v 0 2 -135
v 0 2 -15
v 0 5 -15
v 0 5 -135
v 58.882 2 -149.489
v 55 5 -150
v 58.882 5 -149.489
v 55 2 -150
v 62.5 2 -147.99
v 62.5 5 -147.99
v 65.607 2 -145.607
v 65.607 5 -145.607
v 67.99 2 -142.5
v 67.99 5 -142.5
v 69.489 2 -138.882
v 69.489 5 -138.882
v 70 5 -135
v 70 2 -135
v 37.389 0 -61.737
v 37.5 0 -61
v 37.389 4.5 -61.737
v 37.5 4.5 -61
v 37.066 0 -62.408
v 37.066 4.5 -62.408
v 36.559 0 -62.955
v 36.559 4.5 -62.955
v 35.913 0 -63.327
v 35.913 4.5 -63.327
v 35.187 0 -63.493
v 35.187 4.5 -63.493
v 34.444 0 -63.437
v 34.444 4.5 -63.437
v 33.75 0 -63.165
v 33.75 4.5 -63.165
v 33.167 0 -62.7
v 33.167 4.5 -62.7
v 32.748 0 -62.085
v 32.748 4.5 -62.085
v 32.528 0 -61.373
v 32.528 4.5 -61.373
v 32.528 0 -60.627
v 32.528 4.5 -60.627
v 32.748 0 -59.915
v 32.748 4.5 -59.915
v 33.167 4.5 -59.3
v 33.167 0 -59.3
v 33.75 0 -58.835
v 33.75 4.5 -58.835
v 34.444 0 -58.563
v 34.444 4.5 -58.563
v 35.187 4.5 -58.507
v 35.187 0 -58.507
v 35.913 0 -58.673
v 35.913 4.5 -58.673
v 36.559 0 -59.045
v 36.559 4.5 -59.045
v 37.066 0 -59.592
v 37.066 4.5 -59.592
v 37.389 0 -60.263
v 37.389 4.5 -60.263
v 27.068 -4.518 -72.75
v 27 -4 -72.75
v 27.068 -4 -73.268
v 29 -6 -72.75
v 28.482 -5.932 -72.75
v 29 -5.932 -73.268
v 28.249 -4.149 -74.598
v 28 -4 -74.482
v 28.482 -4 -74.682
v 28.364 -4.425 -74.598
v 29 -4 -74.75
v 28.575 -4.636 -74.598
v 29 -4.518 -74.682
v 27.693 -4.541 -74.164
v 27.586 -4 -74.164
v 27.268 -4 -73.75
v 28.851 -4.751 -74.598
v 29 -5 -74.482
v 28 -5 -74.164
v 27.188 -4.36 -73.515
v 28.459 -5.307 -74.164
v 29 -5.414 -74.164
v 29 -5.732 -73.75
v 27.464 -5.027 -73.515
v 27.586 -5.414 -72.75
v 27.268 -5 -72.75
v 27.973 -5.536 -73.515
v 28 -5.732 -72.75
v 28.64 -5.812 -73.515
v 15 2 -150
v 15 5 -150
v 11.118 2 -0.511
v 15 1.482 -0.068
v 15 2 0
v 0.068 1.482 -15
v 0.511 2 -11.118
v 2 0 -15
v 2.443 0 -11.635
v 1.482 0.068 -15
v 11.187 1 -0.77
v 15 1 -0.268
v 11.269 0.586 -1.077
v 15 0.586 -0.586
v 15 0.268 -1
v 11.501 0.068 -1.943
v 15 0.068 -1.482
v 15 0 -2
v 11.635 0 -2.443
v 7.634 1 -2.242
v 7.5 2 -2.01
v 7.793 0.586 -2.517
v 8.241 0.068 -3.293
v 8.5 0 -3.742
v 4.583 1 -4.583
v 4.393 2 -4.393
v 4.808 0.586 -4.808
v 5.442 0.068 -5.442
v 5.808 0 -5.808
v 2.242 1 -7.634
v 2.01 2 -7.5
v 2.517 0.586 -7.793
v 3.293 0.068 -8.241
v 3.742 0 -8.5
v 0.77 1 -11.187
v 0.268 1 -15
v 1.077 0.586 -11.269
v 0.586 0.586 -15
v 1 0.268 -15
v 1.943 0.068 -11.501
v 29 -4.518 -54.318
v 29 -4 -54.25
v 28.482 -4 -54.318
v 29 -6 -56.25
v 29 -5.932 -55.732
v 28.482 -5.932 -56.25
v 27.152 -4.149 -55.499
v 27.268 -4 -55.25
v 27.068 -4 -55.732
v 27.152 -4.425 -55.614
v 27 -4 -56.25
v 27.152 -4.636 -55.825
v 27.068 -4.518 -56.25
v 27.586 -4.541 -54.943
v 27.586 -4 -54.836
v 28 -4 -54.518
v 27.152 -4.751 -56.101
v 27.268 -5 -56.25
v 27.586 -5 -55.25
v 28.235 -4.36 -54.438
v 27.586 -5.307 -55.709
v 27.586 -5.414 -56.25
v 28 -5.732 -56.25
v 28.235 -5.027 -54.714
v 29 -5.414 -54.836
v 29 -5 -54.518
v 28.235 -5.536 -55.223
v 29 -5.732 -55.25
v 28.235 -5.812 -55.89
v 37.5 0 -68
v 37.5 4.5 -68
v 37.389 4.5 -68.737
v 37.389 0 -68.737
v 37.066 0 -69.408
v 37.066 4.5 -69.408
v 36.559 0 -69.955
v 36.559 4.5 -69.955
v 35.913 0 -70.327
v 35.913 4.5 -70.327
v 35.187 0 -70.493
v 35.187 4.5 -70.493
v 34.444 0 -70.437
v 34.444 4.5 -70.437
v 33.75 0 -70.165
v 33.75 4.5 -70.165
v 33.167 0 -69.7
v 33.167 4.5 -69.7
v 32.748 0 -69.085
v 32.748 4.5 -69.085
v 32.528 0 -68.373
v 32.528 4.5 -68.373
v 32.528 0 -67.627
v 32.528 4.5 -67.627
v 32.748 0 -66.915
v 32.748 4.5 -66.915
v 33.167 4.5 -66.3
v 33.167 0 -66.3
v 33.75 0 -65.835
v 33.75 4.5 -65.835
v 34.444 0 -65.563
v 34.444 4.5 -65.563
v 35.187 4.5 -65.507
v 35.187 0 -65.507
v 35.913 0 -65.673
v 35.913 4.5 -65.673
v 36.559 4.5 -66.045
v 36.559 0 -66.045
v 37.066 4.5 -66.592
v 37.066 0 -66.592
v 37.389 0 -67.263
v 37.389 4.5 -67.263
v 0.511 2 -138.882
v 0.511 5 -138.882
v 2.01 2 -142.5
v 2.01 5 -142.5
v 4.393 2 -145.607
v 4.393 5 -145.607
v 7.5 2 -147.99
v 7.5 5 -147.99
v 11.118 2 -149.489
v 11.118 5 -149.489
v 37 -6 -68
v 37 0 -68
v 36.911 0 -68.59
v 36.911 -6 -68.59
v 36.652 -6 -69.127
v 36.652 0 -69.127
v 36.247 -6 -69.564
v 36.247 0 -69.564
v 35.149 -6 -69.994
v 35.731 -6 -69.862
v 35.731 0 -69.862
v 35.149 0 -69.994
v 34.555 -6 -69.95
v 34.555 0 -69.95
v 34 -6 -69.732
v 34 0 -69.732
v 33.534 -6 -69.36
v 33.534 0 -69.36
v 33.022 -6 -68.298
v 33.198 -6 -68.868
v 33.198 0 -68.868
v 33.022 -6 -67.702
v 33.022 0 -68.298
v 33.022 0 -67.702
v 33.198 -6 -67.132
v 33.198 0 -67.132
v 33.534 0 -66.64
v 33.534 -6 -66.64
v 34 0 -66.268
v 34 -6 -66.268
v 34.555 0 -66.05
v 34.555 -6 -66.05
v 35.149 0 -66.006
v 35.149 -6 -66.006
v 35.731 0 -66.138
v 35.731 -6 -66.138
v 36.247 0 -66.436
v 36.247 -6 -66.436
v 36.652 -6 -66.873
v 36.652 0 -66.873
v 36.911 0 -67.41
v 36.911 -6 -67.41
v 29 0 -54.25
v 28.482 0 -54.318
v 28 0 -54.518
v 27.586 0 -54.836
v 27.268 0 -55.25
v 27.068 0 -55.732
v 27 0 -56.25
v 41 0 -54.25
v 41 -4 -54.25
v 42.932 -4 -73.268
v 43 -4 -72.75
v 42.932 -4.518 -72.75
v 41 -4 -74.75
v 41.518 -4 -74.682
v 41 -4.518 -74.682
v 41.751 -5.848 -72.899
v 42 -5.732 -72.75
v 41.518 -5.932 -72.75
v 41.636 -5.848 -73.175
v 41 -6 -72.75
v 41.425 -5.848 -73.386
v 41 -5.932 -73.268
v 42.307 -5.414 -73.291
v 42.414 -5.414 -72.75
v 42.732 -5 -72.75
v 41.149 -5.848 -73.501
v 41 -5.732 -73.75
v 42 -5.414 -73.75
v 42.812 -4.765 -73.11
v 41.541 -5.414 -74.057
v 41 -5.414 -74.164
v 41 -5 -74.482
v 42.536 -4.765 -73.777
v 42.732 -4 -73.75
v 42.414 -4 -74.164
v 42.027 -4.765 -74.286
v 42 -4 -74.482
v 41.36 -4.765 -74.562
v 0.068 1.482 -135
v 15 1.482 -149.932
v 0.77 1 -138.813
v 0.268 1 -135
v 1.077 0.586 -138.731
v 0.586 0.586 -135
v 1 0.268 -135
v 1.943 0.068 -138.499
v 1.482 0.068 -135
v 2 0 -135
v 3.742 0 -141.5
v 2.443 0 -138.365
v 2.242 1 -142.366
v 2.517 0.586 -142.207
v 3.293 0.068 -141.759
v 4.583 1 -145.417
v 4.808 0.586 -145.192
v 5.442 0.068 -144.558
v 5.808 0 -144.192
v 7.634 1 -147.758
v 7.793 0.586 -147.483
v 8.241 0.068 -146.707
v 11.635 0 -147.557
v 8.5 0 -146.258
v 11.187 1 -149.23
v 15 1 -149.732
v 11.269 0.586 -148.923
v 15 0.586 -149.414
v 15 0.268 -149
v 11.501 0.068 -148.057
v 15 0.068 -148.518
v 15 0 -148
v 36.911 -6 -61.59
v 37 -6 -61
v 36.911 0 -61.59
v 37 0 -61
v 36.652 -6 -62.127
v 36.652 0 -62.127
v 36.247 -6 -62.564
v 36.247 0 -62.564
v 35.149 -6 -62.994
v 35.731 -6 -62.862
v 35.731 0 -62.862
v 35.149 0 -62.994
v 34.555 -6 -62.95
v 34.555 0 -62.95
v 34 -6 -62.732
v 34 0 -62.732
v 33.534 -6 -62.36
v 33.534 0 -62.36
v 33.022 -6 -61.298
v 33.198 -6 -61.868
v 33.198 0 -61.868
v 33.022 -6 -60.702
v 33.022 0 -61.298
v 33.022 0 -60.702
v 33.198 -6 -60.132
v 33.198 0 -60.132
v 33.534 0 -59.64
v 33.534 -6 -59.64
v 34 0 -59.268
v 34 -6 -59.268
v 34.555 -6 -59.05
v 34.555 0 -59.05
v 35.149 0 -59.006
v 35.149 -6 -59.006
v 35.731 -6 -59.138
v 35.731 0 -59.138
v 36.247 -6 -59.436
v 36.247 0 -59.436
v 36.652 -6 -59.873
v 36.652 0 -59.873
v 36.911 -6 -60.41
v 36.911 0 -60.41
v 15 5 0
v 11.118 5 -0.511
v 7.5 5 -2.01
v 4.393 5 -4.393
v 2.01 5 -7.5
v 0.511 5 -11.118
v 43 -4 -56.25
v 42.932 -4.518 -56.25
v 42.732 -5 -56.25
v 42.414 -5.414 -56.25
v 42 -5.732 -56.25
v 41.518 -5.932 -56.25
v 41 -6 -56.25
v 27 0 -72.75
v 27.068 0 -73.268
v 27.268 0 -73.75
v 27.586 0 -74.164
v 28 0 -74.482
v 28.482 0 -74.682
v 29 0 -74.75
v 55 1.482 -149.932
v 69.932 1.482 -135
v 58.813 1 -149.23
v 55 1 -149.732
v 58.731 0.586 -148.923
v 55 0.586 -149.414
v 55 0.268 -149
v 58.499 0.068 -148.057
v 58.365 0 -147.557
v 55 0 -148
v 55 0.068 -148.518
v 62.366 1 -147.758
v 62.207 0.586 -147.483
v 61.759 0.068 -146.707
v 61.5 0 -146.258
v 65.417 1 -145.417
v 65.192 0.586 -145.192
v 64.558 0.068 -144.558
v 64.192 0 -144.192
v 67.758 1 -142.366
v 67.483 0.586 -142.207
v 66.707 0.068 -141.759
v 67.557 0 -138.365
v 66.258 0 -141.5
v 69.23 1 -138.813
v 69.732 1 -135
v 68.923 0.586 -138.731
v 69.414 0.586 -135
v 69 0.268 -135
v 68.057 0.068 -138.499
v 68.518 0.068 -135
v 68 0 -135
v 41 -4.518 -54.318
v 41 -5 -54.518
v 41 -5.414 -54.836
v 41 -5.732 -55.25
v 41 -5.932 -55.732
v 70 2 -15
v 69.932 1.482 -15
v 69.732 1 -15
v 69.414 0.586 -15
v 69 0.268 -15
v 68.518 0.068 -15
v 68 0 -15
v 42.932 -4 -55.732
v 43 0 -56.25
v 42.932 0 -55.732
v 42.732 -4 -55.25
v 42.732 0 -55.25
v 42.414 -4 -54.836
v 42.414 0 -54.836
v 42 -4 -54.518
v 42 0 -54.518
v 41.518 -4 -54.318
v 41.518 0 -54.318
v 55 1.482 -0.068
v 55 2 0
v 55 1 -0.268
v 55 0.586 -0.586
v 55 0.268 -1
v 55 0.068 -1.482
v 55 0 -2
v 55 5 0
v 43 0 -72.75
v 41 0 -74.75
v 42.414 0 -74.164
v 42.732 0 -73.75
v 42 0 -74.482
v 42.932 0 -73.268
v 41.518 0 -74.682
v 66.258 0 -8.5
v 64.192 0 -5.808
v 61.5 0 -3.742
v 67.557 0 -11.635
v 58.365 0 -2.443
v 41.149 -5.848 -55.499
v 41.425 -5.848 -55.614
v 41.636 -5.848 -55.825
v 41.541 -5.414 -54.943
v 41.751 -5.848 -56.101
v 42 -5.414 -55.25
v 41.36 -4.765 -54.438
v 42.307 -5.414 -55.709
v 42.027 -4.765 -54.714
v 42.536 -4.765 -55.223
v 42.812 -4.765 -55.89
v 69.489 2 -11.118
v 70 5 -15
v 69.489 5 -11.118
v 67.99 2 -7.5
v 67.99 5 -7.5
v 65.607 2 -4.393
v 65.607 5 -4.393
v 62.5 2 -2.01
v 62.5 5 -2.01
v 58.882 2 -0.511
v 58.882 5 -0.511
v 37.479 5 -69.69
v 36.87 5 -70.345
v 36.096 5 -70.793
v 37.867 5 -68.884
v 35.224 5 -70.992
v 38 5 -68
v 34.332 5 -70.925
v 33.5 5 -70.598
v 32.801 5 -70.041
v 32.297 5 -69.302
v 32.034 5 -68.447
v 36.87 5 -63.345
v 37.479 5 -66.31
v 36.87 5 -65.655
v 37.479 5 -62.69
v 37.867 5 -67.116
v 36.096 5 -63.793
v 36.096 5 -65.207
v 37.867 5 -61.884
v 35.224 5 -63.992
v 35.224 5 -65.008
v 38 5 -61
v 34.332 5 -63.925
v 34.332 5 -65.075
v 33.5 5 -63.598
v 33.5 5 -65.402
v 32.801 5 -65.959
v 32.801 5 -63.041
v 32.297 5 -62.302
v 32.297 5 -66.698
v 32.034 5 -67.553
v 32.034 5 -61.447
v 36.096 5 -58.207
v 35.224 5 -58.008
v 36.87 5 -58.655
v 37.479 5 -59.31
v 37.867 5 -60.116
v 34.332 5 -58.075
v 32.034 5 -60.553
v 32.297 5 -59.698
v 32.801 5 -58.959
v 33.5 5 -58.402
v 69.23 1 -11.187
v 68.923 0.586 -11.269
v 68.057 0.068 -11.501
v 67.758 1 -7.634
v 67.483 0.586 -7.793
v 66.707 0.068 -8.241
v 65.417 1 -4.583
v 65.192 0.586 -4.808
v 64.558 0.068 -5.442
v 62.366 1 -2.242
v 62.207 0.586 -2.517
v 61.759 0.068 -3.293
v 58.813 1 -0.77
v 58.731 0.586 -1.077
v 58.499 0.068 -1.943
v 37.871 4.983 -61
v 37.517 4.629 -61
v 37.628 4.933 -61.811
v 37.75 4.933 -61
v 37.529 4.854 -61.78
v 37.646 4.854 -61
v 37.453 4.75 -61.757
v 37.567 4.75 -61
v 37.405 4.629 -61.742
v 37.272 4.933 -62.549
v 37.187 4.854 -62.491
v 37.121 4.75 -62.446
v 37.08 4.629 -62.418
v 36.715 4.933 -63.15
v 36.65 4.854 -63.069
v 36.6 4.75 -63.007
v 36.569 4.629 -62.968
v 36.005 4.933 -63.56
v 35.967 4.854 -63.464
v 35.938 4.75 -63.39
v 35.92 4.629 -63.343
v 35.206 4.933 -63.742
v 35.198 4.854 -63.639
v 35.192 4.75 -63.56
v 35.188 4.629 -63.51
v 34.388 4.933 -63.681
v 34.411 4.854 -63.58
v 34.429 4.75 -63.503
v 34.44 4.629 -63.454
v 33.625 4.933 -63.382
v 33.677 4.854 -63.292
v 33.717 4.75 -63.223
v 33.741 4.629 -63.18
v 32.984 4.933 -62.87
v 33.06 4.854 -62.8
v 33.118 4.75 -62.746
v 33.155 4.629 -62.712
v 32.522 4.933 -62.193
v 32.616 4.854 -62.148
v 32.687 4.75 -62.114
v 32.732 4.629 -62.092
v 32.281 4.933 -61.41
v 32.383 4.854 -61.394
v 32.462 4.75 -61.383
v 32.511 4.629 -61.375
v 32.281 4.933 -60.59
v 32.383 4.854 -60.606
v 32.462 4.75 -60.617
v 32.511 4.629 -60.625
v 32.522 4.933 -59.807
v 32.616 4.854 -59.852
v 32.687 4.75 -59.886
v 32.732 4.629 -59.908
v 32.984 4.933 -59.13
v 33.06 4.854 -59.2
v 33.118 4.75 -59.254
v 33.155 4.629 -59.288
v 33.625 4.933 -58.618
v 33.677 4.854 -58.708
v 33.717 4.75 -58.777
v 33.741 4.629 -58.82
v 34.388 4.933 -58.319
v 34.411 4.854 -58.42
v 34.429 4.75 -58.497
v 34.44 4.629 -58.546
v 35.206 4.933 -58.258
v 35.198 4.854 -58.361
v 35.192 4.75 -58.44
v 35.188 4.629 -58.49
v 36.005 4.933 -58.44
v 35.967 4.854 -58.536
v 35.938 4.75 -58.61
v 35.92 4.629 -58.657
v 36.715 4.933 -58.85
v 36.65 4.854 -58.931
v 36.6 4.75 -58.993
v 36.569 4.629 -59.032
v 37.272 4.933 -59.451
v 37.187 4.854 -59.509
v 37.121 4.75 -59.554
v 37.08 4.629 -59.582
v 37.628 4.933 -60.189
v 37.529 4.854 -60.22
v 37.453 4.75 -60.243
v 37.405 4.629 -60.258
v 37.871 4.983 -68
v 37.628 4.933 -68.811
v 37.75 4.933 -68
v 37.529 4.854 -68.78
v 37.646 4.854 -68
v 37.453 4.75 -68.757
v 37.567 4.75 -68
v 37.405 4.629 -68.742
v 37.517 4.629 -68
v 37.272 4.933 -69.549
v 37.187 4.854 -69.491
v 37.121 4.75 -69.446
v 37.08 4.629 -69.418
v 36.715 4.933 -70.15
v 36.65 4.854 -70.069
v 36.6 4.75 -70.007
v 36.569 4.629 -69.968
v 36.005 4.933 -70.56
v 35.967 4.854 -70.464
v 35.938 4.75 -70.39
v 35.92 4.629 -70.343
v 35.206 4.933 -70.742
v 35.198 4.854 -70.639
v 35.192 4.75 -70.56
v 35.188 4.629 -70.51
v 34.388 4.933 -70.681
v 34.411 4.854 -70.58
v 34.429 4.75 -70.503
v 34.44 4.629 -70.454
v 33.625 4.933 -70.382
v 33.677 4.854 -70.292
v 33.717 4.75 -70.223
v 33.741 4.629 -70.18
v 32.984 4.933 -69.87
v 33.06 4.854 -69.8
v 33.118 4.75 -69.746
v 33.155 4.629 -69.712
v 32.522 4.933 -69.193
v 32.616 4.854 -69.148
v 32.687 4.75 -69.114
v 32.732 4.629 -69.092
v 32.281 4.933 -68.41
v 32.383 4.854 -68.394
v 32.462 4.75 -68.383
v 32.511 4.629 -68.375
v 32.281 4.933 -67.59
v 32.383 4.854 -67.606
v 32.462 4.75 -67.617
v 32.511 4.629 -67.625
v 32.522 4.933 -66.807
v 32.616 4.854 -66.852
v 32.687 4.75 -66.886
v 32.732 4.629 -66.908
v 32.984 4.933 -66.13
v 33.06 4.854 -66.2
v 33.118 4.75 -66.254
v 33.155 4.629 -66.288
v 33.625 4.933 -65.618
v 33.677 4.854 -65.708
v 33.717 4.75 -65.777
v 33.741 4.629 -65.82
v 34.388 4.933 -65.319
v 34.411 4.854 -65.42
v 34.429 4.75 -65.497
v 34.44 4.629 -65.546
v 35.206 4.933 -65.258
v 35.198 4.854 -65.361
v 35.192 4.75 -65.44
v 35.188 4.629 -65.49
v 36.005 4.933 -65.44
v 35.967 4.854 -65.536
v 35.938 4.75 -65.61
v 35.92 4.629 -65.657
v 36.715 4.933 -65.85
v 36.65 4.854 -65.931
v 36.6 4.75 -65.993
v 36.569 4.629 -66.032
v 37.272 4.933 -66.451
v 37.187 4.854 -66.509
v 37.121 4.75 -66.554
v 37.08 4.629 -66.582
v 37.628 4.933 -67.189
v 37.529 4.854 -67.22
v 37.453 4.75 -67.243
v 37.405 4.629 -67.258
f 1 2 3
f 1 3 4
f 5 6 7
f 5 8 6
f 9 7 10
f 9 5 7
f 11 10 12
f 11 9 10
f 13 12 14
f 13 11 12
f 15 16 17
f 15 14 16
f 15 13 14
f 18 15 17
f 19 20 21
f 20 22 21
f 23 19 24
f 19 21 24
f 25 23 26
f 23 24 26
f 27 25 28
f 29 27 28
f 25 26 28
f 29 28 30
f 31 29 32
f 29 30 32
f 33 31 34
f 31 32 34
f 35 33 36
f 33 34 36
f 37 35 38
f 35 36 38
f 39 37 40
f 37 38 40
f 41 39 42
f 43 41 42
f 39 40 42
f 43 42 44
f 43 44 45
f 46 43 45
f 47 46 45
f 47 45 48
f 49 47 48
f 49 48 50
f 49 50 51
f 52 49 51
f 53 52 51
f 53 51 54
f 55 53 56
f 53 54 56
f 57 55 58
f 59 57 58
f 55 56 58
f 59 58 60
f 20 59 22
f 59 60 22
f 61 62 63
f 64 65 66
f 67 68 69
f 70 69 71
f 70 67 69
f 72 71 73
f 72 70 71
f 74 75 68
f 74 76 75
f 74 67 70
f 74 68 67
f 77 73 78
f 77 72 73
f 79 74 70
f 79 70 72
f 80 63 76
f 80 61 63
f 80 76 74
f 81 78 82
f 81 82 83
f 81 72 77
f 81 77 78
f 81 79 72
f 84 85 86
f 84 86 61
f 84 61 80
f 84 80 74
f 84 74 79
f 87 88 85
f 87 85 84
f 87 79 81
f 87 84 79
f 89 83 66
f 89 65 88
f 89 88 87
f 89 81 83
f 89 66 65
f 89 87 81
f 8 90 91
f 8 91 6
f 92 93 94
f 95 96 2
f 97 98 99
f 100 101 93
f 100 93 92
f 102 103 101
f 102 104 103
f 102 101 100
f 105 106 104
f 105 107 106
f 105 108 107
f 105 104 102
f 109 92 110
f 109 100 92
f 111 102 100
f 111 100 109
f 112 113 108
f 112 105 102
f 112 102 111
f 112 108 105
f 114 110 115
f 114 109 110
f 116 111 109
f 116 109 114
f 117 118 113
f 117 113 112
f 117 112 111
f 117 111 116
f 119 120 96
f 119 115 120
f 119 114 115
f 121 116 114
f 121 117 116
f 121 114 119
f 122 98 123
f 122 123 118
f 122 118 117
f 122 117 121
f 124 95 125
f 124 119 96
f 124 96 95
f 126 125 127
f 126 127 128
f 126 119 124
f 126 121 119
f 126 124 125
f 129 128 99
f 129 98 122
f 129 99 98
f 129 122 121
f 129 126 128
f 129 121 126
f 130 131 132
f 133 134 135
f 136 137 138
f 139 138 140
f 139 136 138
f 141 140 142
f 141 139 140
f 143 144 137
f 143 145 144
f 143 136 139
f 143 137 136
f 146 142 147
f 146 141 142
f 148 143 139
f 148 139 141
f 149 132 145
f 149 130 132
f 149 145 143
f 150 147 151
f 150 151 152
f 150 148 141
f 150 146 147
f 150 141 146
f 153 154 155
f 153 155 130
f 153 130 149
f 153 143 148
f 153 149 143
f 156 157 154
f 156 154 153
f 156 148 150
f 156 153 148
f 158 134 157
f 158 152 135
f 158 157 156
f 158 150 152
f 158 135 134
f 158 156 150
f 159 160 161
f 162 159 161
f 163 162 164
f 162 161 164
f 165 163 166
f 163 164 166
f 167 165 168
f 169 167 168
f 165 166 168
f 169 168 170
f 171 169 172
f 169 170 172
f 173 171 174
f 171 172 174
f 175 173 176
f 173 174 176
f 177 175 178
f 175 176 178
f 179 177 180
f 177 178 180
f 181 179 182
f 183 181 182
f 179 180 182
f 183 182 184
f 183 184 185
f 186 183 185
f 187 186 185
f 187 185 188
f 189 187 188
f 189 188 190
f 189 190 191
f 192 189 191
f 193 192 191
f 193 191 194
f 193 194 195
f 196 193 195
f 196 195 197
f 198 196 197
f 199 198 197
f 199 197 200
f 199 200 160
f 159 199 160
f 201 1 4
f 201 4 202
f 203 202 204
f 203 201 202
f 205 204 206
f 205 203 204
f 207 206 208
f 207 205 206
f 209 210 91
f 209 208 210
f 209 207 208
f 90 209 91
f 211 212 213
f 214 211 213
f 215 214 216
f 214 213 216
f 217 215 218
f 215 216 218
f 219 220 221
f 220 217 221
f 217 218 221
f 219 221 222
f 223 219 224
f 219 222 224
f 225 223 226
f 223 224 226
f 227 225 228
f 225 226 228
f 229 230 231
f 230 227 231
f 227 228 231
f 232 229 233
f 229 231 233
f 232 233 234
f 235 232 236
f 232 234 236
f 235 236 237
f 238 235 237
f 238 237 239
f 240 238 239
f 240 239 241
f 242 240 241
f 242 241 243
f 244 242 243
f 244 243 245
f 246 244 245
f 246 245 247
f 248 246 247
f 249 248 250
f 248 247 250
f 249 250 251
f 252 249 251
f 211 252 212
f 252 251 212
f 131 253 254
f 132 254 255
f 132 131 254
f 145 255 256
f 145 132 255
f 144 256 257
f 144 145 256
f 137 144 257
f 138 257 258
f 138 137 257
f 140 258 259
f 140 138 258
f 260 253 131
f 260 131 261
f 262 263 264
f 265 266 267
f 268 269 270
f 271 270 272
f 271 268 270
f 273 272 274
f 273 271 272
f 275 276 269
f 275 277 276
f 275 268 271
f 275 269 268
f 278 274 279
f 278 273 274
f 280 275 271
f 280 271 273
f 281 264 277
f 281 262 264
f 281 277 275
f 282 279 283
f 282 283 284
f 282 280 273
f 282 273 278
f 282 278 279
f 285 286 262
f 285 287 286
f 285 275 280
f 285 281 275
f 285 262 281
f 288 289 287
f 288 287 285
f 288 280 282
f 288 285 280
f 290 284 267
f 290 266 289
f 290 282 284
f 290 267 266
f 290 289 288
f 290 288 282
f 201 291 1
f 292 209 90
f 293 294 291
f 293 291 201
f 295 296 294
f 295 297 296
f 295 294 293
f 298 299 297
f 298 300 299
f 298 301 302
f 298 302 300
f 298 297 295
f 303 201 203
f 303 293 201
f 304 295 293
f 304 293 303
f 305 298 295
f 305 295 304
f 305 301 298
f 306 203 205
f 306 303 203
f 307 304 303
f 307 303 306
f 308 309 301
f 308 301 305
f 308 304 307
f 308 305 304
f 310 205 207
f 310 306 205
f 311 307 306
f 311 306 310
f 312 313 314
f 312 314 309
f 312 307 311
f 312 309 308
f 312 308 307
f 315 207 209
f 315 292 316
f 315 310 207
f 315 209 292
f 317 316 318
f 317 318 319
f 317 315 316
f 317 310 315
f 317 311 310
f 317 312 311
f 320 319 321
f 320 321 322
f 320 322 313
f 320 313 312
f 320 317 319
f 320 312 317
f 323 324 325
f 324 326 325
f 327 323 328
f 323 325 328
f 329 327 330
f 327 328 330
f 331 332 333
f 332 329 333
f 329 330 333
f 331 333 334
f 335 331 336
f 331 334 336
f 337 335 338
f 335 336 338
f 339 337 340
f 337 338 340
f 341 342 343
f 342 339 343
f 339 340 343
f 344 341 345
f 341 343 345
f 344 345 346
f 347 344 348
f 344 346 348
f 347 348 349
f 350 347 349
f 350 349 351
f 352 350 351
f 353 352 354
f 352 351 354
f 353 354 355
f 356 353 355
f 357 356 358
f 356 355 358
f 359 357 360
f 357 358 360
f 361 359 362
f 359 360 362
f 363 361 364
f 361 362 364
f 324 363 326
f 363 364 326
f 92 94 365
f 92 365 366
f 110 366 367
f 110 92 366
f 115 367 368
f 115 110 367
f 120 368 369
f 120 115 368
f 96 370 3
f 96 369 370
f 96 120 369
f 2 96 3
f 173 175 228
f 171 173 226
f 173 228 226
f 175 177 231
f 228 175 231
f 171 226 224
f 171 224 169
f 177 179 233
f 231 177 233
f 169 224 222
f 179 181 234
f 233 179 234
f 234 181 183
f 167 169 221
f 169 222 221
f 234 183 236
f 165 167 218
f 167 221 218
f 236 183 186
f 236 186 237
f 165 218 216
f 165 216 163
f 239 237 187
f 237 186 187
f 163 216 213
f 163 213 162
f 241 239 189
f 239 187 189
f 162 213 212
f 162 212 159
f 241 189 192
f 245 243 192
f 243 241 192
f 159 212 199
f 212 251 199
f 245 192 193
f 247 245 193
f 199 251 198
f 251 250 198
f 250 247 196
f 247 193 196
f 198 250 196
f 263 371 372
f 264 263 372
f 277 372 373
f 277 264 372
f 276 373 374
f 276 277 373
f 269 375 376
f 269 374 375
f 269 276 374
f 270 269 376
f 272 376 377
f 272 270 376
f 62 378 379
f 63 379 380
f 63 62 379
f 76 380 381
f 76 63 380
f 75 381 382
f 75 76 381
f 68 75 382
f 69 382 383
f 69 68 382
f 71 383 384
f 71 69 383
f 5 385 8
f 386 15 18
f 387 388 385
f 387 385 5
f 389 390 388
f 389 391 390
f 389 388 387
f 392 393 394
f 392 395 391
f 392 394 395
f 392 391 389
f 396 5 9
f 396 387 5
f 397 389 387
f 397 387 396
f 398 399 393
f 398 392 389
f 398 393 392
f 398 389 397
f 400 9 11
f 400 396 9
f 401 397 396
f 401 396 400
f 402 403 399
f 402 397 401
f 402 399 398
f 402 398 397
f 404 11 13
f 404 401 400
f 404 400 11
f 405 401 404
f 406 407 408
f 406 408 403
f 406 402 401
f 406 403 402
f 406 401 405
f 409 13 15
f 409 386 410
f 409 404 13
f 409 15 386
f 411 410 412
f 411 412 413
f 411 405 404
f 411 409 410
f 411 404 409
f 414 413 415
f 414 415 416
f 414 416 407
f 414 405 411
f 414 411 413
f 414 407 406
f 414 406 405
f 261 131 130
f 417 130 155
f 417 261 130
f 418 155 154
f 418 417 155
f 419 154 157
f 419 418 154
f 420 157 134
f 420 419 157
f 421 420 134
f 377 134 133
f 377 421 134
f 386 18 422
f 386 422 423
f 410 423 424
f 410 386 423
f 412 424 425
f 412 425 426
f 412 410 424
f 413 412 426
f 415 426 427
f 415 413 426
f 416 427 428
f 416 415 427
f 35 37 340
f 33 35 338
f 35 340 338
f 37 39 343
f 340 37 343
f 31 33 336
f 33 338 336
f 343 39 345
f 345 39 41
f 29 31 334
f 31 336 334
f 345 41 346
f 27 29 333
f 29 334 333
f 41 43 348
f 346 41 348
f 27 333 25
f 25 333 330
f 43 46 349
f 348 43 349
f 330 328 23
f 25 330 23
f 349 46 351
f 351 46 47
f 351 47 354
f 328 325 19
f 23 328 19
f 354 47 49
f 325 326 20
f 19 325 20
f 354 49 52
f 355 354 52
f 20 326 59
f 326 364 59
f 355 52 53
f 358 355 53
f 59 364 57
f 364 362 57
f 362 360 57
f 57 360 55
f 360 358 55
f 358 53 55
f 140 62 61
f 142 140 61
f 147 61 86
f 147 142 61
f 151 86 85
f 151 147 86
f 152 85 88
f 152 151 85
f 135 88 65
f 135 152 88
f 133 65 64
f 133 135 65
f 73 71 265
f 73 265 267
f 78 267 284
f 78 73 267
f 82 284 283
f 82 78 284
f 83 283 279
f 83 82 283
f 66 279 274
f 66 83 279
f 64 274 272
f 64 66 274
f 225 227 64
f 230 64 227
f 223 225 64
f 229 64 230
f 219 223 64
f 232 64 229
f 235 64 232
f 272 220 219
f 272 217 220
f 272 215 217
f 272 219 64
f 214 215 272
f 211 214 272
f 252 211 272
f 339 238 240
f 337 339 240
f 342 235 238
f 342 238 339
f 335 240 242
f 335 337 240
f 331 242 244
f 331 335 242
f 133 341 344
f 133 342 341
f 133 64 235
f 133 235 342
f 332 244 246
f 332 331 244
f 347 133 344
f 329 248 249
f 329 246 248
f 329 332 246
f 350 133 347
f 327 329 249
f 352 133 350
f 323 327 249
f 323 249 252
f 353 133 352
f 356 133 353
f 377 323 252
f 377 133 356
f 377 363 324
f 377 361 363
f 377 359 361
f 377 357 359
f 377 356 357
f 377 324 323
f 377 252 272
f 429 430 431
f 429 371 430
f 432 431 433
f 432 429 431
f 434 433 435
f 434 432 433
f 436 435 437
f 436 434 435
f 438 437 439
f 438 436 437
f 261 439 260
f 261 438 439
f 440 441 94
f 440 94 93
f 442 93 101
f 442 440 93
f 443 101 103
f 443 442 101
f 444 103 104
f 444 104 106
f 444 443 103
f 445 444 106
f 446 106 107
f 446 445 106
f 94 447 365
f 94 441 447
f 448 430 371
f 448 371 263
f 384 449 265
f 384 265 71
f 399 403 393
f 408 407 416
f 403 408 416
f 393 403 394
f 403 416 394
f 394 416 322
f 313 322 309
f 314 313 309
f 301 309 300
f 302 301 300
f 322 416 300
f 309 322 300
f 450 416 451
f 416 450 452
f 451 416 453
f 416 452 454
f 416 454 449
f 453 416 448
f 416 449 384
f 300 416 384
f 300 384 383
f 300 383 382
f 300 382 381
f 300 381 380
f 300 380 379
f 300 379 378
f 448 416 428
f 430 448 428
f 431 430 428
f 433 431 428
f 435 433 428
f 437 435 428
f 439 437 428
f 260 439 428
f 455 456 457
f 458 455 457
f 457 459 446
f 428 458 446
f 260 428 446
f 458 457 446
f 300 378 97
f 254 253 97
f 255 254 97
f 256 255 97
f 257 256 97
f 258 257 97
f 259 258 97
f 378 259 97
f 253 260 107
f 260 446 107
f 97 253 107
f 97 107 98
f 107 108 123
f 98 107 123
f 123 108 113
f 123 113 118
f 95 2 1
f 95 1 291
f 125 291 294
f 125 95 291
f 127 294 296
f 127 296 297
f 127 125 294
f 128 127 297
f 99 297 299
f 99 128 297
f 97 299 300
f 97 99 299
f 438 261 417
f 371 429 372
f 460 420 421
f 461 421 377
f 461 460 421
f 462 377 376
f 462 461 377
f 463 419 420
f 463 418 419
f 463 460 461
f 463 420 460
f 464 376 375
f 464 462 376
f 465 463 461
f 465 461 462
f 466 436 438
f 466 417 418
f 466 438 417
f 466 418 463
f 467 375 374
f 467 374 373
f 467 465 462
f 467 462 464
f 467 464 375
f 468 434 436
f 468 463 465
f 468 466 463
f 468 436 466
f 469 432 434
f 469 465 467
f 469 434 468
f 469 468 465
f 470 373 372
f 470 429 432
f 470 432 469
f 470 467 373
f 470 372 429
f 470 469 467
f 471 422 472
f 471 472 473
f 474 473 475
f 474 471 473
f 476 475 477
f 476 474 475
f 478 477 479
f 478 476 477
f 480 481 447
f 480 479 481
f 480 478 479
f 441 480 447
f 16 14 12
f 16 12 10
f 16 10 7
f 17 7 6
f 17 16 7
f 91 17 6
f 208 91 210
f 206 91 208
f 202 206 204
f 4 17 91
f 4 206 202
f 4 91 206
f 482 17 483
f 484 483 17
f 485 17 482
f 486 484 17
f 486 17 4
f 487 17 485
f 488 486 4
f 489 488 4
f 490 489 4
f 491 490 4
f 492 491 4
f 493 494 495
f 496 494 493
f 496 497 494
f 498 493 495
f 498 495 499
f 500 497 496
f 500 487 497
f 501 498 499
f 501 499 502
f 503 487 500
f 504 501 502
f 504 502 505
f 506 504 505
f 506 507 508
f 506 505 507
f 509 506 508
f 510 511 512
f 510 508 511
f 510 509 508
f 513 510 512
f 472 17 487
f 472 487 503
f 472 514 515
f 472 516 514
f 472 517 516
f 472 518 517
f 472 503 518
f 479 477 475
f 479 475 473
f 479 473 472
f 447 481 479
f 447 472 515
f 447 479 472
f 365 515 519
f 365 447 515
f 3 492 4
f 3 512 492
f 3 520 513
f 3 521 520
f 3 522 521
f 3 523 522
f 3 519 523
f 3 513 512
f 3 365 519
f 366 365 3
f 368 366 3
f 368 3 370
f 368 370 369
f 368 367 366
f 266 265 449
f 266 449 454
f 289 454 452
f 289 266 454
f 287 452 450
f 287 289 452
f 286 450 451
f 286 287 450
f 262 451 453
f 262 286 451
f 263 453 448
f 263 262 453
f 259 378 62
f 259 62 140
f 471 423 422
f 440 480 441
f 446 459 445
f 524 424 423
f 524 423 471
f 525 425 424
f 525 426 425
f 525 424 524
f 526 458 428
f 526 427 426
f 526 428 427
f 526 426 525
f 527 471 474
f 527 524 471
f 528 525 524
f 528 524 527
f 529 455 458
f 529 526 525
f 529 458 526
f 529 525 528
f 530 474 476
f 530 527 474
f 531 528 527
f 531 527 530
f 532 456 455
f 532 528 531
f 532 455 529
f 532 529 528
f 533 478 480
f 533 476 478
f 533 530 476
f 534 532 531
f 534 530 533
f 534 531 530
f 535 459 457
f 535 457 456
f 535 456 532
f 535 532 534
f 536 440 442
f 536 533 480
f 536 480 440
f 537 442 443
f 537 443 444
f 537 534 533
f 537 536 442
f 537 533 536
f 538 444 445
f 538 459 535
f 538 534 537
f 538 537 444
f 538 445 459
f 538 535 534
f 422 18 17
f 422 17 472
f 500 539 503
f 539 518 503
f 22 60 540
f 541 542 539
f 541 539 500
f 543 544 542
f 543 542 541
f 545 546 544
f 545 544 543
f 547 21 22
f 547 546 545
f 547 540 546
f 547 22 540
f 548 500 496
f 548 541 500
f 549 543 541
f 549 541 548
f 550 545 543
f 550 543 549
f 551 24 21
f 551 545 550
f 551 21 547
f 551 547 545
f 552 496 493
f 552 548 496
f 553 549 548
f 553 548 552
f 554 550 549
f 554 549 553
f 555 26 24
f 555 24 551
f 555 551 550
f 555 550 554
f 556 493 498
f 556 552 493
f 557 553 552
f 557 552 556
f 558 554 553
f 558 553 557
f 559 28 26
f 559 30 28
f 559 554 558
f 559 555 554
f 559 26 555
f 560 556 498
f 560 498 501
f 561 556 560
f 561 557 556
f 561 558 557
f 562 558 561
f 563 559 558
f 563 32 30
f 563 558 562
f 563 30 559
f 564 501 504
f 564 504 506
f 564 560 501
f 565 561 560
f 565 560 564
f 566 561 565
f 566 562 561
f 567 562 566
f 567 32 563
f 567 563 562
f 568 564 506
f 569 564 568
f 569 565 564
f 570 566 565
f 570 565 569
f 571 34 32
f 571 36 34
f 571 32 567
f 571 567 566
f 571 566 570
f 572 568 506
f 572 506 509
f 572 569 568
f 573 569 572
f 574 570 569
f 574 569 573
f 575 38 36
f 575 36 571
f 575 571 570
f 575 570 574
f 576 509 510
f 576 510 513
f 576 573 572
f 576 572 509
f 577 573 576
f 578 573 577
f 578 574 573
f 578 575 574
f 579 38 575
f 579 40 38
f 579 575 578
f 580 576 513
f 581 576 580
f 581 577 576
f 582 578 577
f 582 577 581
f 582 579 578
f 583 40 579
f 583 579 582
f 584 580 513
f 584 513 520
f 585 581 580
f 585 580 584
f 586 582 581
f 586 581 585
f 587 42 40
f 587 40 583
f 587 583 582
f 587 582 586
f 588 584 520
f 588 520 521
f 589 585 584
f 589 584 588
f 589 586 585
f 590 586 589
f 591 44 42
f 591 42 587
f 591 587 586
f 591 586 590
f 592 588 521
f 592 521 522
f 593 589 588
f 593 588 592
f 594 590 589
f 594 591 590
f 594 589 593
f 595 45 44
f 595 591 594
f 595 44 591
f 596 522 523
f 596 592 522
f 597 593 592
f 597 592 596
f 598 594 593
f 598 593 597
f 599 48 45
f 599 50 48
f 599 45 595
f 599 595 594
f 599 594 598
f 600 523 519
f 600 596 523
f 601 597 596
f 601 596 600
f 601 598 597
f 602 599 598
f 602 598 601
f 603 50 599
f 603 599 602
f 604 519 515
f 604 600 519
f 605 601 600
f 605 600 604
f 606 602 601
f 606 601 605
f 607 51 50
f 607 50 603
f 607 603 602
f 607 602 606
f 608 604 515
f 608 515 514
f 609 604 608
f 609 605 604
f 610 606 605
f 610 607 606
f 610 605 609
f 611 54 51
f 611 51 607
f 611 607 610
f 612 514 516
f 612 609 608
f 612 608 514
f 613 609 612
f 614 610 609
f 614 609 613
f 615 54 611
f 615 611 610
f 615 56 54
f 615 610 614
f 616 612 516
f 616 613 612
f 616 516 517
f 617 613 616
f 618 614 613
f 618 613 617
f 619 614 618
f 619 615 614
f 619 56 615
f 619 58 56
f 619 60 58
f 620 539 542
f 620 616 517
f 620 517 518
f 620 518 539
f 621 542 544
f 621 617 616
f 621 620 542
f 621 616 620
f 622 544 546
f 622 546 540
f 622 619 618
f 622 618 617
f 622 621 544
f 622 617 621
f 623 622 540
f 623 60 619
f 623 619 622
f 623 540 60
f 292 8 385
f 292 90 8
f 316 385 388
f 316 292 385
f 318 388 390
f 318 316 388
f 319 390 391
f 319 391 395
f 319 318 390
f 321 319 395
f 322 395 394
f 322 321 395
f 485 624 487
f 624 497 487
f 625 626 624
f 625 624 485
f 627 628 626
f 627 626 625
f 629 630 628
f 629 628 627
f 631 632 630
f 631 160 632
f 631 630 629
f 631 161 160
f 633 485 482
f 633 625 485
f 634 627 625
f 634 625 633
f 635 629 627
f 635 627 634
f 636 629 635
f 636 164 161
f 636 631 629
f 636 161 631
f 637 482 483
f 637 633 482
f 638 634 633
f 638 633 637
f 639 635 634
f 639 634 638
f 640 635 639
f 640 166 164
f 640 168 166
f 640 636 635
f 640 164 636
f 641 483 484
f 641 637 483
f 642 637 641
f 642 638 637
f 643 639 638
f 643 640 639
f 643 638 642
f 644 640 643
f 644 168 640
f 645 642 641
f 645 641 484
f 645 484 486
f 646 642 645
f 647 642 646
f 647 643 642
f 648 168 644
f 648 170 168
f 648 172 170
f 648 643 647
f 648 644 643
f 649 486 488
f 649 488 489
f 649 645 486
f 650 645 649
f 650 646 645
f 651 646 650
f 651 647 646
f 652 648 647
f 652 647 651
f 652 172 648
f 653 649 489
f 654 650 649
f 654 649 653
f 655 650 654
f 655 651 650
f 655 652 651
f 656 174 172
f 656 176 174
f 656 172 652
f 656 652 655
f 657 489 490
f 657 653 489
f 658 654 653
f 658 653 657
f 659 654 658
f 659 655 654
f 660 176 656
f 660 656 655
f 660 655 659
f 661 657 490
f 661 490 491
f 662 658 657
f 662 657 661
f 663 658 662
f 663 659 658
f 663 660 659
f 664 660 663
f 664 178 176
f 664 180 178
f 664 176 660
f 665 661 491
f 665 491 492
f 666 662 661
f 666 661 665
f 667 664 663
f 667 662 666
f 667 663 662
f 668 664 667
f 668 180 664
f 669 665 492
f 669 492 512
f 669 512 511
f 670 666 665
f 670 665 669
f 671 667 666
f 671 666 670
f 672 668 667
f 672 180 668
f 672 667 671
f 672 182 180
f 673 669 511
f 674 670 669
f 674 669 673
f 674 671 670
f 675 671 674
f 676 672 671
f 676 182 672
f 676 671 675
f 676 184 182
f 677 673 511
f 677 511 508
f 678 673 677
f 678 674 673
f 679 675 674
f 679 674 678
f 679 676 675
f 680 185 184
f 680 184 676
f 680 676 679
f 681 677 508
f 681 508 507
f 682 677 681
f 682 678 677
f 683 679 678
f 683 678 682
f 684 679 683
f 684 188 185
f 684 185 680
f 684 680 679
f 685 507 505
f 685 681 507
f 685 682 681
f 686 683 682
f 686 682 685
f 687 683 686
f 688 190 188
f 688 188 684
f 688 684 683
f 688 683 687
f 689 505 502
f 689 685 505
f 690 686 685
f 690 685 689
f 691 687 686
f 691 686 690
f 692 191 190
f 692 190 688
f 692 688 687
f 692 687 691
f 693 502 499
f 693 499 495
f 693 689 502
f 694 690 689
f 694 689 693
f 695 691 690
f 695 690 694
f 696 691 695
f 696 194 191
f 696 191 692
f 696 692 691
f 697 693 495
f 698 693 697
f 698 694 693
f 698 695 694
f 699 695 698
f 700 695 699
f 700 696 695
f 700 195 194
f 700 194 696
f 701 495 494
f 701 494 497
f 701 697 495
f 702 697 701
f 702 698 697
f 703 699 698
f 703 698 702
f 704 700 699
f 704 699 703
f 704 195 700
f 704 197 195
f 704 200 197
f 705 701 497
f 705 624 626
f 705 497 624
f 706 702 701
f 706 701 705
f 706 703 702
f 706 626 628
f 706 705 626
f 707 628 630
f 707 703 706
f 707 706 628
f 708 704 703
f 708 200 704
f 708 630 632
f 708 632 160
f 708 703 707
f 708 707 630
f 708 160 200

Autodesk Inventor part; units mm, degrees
ref_plane "YZ Plane" through (0, 0, 0) normal (1, 0, 0) x (0, 1, 0)
ref_plane "XZ Plane" through (0, 0, 0) normal (0, 1, 0) x (-1, 0, 0)
ref_plane "XY Plane" through (0, 0, 0) normal (0, 0, 1) x (1, 0, 0)
sketch "Esboço4" plane through (0, 0, 0) normal (0, 1, 0) x (-1, 0, 0)
  line L0 (0, -15) -> (0, -135)
  line L1 (-15, -150) -> (-55, -150)
  line L2 (-70, -135) -> (-70, -15)
  line L3 (-55, 0) -> (-15, 0)
  arc A0 (-15, -150) -> (0, -135) centre (-15, -135) ccw
  arc A1 (-70, -135) -> (-55, -150) centre (-55, -135) ccw
  arc A2 (-55, 0) -> (-70, -15) centre (-55, -15) ccw
  arc A3 (0, -15) -> (-15, 0) centre (-15, -15) ccw
  point P0 (0, 0)
  point P1 (0, -150)
  point P2 (-70, -150)
  dimension "d7" = 150
  dimension "d8" = 70
  dimension "d9" = 15
extrude "Extrusão2" add sketch "Esboço4" along normal blind 5
sketch "Esboço5" plane through (0, 5, 0) normal (0, 1, 0) x (1, 0, 0)
  line L0 (15, 0) -> (55, 0) projected
  line L1 (55, 150) -> (15, 150) projected
  circle A0 centre (35, 61) radius 2.5
  circle A1 centre (35, 68) radius 2.5
  point P0 (0, 0)
extrude "Extrusão3" cut sketch "Esboço5" against normal through all
sketch "Sketch7" plane through (0, 0, 0) normal (0, -1, 0) x (1, 0, 0)
  circle A0 centre (35, -61) radius 2 projected
  circle A1 centre (35, -68) radius 2 projected
  line L0 (43, -68) -> (43, -74.75)
  line L1 (43, -74.75) -> (27, -74.75)
  line L2 (27, -74.75) -> (27, -54.25)
  line L3 (27, -54.25) -> (43, -54.25)
  line L4 (43, -54.25) -> (43, -68)
  point P0 (0, 0)
  dimension "d25" = 8
extrude "Extrusion4" add sketch "Sketch7" along normal blind 6
fillet "Fillet4" radius 2 8 edges at (43, -3, -54.25) (43, -3, -74.75) (43, -6, -64.5) (35, -6, -54.25) (27, -6, -64.5) (35, -6, -74.75) (27, -3, -74.75) (27, -3, -54.25)
fillet "Fillet5" radius 0.5 2 edges at (32.5, 5, -61) (32.5, 5, -68)
fillet "Fillet7" radius 2 8 edges at (65.6066, 0, -145.6066) (35, 0, -150) (4.3934, 0, -145.6066) (0, 0, -75) (4.3934, 0, -4.3934) (35, 0, 0) (65.6066, 0, -4.3934) (70, 0, -75)
properties part number "Base superior(suporte)_3DPrint"
